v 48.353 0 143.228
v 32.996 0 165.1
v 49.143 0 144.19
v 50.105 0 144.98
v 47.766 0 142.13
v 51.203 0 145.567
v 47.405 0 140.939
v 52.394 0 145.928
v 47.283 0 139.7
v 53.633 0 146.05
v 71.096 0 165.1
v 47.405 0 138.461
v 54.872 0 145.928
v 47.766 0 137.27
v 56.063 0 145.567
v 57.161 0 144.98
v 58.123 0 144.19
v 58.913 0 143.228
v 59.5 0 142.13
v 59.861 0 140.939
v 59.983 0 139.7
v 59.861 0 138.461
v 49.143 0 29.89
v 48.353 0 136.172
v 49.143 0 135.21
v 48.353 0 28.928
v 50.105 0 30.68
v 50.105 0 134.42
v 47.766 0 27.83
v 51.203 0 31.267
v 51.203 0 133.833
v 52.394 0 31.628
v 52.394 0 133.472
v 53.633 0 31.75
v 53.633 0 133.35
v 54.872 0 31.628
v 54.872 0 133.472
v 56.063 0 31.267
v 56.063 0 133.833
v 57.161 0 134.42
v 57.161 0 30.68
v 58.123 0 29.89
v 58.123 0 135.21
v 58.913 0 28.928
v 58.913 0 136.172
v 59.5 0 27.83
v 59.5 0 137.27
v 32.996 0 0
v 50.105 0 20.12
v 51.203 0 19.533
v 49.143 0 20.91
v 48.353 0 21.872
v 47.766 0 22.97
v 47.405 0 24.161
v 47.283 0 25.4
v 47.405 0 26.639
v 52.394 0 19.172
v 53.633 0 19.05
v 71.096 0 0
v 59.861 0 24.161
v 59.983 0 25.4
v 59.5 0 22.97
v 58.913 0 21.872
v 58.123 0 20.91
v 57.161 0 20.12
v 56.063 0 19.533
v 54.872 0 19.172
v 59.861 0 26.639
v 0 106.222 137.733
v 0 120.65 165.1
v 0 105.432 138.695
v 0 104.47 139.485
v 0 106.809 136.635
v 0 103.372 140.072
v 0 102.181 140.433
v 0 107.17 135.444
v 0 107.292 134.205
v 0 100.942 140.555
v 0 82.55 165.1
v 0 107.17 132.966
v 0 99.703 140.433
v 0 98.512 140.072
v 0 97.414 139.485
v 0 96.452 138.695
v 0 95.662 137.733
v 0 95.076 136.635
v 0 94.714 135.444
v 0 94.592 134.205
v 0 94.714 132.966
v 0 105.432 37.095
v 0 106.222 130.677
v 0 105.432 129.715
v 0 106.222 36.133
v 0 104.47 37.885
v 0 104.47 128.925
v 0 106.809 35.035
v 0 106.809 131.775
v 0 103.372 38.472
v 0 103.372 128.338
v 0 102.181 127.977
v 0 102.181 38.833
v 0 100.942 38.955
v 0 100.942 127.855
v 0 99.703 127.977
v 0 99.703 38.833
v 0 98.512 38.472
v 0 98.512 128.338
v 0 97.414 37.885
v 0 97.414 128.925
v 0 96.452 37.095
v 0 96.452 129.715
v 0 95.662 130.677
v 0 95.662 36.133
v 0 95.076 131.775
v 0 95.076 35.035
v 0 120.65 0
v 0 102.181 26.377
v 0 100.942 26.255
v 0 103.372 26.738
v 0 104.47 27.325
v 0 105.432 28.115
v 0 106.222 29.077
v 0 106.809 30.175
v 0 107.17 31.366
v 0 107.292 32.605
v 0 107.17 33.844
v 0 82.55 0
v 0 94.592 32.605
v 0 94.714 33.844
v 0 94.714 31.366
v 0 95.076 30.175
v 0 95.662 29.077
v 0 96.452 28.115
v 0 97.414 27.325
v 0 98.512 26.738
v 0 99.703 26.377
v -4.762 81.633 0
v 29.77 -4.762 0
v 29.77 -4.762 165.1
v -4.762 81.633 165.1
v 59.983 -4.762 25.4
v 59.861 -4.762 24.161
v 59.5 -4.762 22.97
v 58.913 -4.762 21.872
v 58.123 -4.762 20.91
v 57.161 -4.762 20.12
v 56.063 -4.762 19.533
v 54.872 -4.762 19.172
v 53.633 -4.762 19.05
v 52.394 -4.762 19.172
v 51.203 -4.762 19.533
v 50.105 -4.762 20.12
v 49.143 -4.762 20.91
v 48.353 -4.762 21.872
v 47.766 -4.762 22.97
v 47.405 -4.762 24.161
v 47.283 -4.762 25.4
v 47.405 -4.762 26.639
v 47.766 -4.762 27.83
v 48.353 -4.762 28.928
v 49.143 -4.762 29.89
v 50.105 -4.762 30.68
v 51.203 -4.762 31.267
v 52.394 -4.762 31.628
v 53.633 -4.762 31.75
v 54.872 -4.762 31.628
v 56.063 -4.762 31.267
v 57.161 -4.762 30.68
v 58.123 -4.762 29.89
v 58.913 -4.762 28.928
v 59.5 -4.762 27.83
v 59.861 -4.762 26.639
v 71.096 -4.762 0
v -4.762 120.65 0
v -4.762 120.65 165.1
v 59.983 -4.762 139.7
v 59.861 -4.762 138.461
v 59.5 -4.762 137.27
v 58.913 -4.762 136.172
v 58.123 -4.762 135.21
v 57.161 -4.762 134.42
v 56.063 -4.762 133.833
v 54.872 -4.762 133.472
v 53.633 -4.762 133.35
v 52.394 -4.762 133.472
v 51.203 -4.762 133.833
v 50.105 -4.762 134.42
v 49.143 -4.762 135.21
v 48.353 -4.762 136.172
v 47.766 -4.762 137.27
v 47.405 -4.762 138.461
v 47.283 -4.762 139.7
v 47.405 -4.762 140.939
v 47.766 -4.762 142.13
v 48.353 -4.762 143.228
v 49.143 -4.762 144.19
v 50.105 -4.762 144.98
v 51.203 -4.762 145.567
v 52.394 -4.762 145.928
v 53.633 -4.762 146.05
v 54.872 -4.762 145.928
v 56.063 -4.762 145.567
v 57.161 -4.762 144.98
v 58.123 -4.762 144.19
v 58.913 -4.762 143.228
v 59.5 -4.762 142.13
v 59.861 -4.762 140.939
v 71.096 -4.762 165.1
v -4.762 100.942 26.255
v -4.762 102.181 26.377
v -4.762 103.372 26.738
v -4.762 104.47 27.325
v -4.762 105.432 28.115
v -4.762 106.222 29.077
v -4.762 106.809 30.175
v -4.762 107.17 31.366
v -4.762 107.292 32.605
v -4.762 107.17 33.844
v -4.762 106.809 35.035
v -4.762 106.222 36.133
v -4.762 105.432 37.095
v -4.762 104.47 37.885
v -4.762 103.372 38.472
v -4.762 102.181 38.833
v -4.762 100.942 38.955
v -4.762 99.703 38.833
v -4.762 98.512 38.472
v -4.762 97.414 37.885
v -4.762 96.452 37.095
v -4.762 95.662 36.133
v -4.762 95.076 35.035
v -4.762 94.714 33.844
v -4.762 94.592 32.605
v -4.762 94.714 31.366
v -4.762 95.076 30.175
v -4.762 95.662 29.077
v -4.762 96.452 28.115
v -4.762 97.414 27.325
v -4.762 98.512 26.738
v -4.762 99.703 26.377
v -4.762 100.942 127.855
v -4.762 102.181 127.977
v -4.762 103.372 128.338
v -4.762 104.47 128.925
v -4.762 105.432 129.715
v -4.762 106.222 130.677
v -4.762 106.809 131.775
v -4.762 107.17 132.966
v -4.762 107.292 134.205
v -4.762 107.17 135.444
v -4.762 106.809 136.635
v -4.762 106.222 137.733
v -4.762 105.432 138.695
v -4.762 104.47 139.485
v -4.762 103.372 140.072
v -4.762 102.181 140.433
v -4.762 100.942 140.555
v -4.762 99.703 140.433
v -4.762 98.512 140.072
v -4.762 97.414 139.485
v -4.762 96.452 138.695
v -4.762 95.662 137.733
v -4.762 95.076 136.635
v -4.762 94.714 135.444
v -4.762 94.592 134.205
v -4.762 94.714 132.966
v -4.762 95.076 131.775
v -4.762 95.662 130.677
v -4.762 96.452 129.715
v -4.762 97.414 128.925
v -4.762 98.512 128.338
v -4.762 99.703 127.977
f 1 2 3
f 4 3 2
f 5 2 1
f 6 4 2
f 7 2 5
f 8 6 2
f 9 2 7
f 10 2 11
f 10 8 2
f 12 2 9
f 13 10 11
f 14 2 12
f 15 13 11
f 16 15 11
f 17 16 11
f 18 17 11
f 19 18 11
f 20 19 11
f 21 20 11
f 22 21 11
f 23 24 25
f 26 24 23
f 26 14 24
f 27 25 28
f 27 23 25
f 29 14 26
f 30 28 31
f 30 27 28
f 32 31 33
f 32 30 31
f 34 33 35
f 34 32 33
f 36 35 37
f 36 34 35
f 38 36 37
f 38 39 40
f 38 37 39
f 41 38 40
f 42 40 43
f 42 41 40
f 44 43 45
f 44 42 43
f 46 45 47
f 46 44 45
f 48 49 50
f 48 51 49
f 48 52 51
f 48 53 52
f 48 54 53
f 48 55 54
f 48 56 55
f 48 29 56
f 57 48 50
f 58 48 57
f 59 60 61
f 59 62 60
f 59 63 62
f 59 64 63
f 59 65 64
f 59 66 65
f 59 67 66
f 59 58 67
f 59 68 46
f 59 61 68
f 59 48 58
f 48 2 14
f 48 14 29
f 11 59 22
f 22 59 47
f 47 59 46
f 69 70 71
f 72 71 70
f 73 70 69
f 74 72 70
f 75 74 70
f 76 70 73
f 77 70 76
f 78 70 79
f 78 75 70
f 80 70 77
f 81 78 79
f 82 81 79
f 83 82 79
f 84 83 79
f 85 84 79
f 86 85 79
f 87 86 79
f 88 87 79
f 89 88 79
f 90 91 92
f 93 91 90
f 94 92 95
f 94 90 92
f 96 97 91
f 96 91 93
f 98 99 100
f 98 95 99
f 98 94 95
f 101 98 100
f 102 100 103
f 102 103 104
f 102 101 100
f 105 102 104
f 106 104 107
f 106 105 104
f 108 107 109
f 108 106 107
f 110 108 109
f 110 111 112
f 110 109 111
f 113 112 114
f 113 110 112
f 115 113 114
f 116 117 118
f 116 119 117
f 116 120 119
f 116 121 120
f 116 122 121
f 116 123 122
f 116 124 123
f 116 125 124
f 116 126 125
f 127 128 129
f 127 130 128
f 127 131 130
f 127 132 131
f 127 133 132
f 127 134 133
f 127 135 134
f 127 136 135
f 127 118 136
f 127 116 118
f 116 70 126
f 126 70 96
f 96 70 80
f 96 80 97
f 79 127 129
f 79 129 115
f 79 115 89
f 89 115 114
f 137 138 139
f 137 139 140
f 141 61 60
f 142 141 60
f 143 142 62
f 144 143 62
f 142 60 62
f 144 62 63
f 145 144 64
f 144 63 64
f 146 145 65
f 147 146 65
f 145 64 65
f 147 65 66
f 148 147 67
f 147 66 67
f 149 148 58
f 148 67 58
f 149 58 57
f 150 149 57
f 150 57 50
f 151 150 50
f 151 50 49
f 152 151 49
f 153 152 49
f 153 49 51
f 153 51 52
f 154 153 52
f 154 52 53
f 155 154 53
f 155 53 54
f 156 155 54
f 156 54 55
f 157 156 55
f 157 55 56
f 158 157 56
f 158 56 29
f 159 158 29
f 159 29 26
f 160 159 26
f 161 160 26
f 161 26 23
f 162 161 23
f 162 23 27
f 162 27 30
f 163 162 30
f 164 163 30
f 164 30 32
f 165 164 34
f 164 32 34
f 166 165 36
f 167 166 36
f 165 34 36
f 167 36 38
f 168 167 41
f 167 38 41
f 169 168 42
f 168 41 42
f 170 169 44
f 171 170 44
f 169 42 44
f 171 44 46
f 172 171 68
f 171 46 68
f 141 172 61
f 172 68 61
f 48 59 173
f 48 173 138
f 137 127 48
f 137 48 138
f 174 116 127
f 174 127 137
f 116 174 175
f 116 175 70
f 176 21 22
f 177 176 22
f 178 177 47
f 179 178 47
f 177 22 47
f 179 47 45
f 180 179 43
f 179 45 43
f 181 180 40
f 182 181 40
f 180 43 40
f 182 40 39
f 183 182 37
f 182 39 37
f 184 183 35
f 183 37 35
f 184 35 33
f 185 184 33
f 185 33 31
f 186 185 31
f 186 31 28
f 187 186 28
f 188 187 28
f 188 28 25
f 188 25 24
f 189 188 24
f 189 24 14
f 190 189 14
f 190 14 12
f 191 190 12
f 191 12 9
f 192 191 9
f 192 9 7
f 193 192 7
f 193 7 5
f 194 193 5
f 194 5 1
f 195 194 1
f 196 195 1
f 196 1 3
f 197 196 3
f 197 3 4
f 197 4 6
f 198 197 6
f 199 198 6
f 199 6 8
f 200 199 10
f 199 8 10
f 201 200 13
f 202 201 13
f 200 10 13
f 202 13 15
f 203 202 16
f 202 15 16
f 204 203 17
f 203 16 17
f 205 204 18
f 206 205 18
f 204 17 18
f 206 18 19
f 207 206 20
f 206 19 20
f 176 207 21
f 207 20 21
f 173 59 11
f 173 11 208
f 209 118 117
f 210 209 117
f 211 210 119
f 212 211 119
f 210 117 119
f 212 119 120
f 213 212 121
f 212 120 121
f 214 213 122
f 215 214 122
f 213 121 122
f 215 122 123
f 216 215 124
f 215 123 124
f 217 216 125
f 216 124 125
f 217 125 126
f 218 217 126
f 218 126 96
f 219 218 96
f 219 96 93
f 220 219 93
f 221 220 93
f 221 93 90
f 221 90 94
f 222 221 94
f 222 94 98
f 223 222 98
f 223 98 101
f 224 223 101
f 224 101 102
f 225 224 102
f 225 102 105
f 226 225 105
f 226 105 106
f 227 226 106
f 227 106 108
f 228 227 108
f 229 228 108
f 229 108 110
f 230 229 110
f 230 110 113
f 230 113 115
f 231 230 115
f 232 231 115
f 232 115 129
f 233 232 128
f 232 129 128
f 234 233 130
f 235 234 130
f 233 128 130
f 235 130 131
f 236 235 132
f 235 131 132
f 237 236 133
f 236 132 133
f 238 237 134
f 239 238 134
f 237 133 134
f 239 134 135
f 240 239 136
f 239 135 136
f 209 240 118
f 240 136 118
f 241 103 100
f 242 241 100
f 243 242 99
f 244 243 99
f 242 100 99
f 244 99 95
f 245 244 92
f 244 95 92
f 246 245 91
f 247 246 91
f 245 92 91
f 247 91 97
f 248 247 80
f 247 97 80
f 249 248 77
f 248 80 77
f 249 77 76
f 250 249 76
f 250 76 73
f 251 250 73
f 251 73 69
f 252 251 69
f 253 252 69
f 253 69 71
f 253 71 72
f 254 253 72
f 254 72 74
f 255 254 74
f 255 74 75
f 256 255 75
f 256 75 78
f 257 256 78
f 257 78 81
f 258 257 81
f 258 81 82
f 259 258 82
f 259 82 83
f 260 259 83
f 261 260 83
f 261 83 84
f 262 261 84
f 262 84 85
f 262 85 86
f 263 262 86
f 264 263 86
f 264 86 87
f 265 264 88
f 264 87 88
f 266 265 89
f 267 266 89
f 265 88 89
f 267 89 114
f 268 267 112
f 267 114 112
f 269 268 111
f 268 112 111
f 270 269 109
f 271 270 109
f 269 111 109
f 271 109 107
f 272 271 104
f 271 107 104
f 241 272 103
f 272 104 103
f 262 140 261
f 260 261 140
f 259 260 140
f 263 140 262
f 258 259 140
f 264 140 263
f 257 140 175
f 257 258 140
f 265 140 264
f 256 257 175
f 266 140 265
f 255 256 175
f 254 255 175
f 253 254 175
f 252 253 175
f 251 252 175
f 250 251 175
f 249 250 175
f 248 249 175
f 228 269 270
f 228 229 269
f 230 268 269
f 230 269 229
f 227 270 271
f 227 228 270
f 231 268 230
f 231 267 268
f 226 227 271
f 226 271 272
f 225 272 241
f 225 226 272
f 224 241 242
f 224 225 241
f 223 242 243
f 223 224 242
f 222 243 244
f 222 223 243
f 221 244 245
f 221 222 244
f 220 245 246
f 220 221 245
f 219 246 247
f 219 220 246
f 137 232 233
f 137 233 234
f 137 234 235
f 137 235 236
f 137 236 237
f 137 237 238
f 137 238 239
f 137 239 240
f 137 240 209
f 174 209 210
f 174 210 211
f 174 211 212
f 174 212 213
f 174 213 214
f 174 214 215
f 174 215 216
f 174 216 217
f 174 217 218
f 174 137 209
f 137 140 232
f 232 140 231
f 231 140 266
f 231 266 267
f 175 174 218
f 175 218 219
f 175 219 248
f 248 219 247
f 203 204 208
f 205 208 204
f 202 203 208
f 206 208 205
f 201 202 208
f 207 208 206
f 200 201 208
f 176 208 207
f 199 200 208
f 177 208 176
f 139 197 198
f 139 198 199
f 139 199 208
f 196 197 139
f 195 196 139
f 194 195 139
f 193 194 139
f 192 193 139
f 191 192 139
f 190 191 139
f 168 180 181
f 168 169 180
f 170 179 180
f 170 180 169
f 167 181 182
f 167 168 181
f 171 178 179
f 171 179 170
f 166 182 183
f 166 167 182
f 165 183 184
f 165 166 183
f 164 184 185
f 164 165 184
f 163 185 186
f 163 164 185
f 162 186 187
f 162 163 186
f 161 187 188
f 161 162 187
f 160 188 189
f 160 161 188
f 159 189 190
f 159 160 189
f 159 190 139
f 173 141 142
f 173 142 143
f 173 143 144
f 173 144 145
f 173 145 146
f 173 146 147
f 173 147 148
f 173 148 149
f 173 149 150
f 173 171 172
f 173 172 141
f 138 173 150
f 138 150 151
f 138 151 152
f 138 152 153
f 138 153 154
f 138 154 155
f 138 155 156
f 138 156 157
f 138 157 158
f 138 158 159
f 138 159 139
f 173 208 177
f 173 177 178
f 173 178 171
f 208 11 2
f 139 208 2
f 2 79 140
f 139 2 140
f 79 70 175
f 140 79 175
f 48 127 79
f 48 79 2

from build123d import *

# Parameters (mm, degrees)
EXTRUDE_THIN1_DEPTH = 165.1
SKETCH2_R           = 6.35
CUT_EXTRUDE1_DEPTH  = 5.7625
SKETCH3_R           = 6.35
CUT_EXTRUDE2_DEPTH  = 5.7625


with BuildPart() as part:
    # Sketch1 → Extrude-Thin1 (new body)
    with BuildSketch(Plane.XY):
        Polygon((0, 120.65), (0, 82.55), (32.995567884, 0), (71.095567884, 0), (71.095567884, -4.7625), (29.770312185, -4.7625), (-4.7625, 81.633456448), (-4.7625, 120.65), align=None)
    extrude(amount=EXTRUDE_THIN1_DEPTH)

    # Sketch2 → Cut-Extrude1 (cut, through all)
    with BuildSketch(Plane(origin=(0, 0, 0), x_dir=(0, 0, -1), z_dir=(1, 0, 0))):
        with Locations((-134.204880657, 100.94227704)):
            Circle(SKETCH2_R)
        with Locations((-32.604880657, 100.94227704)):
            Circle(SKETCH2_R)
    extrude(amount=-CUT_EXTRUDE1_DEPTH, mode=Mode.SUBTRACT)

    # Sketch3 → Cut-Extrude2 (cut, through all)
    with BuildSketch(Plane(origin=(0, 0, 0), x_dir=(1, 0, 0), z_dir=(0, 1, 0))):
        with Locations((53.633067884, -25.4)):
            Circle(SKETCH3_R)
        with Locations((53.633067884, -139.7)):
            Circle(SKETCH3_R)
    extrude(amount=-CUT_EXTRUDE2_DEPTH, mode=Mode.SUBTRACT)


solid = part.part
